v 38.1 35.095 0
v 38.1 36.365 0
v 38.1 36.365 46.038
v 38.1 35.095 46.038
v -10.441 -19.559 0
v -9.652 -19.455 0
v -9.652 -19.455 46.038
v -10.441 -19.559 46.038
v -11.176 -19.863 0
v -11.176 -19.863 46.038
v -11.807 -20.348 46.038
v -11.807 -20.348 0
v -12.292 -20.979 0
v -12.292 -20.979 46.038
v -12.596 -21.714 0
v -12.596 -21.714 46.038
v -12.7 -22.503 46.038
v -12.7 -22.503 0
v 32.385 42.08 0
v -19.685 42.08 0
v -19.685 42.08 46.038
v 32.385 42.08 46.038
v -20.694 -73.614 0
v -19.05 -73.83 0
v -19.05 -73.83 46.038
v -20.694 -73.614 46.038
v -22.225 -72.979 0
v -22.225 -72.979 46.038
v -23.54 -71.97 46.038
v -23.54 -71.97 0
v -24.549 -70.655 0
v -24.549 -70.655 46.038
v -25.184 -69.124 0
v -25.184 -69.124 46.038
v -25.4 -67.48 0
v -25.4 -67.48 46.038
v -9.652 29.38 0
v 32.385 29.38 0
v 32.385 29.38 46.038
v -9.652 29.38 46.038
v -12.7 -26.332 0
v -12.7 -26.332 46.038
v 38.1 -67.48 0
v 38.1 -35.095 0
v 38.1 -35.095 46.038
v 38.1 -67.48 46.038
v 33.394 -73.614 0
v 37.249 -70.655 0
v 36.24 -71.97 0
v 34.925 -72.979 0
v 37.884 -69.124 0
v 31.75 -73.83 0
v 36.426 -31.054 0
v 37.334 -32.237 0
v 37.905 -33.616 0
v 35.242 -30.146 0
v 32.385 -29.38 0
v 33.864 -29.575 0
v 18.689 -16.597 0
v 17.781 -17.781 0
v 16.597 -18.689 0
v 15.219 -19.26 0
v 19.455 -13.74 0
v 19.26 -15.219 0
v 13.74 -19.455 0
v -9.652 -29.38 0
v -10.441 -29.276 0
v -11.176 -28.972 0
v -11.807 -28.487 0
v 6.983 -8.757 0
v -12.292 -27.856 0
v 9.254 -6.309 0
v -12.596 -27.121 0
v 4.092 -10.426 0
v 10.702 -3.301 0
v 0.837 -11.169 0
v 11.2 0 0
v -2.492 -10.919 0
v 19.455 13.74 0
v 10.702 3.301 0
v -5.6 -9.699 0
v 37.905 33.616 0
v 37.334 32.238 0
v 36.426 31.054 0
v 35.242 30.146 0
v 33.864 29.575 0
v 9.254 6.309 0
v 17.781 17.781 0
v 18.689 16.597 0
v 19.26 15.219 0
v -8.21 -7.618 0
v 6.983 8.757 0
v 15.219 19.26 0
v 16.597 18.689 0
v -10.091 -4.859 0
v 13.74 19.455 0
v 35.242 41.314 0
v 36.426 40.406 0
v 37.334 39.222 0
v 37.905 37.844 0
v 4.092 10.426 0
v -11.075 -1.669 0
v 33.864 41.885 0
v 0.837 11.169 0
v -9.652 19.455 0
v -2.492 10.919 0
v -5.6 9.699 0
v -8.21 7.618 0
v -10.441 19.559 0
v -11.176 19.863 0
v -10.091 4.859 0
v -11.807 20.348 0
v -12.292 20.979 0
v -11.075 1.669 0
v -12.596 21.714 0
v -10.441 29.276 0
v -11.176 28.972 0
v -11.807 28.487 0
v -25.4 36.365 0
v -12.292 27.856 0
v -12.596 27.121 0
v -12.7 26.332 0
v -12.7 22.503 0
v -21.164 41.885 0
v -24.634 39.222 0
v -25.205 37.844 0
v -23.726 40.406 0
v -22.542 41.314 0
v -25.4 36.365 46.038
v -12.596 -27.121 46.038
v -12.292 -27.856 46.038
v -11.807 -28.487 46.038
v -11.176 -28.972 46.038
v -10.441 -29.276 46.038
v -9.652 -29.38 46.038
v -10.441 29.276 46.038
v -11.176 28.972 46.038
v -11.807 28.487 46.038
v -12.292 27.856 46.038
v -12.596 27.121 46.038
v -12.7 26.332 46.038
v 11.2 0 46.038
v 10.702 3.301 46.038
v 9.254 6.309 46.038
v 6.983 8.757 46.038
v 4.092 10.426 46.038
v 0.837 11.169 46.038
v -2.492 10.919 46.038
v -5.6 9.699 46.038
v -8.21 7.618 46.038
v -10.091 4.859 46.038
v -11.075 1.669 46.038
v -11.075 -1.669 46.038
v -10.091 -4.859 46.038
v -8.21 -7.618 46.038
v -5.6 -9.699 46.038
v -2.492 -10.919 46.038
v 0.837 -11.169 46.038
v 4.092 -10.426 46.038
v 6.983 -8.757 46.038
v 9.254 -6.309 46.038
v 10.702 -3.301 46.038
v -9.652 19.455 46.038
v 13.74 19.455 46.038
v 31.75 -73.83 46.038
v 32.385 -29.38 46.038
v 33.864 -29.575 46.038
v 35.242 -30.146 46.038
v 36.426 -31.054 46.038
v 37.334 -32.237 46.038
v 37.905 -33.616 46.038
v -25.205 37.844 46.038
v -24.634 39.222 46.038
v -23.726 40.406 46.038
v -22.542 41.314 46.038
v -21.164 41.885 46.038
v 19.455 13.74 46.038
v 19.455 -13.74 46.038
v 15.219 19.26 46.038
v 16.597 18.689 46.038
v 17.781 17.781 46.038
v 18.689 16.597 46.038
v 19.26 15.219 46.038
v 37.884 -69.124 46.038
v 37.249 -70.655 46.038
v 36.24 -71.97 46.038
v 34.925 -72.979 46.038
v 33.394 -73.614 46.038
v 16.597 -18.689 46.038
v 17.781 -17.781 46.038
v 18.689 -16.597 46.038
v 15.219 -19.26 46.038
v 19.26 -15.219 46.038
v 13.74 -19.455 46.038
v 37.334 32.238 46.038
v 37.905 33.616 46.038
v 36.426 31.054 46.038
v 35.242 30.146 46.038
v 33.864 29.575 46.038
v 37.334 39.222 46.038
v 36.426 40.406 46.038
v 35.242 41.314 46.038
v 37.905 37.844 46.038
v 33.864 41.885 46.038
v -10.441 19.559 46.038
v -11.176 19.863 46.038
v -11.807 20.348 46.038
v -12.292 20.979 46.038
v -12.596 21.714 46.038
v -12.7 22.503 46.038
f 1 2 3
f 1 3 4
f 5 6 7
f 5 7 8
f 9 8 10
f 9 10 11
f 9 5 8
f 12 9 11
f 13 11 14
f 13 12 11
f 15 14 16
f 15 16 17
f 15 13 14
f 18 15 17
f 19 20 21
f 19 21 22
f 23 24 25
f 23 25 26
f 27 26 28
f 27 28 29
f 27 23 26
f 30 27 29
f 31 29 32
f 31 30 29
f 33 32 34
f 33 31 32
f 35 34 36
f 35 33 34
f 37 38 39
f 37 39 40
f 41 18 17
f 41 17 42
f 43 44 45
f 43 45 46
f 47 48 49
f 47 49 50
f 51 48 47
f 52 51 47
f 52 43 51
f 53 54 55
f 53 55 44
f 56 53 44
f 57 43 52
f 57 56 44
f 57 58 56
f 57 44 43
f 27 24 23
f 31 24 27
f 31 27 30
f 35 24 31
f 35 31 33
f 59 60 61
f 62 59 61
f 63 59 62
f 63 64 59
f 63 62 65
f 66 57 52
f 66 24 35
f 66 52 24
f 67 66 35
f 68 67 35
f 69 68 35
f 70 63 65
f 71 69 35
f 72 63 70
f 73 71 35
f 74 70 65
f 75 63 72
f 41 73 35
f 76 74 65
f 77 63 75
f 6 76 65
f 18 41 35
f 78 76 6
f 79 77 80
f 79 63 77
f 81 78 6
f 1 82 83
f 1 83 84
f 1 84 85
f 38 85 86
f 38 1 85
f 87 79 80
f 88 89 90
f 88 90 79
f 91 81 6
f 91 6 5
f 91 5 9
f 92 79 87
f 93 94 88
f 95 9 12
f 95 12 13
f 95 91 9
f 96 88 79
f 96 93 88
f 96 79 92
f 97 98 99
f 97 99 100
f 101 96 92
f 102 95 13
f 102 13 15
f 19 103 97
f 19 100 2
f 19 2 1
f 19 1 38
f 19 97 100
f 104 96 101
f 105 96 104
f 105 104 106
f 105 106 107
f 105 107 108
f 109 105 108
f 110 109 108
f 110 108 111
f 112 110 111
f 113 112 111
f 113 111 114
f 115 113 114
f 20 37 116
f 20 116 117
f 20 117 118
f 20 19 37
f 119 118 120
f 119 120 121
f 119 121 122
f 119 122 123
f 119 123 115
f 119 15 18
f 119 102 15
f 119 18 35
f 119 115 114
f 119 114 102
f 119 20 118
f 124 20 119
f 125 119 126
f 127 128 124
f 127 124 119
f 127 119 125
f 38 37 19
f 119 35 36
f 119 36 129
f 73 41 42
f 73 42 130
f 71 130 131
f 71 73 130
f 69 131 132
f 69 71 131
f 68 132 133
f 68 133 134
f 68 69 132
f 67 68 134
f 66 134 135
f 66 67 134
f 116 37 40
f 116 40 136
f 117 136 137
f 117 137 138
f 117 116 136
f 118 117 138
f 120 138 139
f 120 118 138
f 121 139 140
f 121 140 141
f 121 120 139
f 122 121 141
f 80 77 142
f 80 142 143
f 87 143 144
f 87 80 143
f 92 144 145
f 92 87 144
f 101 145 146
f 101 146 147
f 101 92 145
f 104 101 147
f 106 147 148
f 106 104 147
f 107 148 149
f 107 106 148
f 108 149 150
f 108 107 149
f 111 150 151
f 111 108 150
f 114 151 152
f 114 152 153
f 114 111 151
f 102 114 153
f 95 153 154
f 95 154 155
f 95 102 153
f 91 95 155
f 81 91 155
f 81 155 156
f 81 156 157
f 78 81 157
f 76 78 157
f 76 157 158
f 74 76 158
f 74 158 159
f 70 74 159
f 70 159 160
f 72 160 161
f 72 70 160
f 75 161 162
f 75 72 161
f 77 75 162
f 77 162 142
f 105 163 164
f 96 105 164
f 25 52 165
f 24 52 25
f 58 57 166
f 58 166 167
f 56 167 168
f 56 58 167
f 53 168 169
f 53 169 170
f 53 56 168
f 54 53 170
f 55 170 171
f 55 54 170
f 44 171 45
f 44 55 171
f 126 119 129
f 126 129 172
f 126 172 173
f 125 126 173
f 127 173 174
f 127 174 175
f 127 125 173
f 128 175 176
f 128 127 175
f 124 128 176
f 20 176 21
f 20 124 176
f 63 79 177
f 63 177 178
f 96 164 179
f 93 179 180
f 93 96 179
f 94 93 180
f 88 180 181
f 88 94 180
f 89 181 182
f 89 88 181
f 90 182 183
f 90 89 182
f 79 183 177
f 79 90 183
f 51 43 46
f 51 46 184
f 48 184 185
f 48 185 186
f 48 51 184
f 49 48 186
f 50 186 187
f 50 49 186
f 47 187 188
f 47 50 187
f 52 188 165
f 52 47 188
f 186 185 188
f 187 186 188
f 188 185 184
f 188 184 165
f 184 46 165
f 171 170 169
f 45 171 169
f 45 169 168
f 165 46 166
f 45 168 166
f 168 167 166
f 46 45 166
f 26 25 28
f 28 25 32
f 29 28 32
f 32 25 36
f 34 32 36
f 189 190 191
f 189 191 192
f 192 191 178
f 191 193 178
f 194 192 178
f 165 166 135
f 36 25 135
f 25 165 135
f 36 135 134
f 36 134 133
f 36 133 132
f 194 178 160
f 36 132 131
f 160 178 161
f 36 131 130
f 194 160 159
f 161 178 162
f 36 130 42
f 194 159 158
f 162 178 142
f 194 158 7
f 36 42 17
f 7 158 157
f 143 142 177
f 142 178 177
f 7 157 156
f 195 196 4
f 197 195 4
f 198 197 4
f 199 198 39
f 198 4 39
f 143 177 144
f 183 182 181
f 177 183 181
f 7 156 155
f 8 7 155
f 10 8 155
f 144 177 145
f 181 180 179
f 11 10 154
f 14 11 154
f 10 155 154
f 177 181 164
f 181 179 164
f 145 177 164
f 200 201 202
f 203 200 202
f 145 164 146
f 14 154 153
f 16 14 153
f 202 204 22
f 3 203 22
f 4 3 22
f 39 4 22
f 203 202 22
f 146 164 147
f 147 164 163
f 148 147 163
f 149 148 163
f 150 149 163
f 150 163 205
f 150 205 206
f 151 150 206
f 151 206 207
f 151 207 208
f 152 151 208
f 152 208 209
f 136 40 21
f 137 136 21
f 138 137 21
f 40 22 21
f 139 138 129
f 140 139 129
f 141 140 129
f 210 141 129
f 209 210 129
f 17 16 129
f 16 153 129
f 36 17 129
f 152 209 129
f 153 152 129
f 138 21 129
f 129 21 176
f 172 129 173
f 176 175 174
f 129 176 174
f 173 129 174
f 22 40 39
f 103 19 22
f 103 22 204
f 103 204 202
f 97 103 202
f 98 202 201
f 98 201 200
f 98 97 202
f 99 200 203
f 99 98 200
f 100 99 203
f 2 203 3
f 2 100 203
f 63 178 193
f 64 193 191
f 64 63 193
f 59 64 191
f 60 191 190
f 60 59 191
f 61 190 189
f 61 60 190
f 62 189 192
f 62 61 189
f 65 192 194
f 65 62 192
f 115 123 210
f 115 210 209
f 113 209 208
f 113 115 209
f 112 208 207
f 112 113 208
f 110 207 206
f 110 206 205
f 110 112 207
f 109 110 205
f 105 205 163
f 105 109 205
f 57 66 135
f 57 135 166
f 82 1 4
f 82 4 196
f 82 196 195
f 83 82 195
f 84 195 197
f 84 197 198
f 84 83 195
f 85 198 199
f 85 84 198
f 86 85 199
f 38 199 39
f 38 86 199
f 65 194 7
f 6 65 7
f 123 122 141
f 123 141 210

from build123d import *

# Parameters (mm, degrees)
SKETCH1_R           = 11.2
BOSS_EXTRUDE1_DEPTH = 46.0375


with BuildPart() as part:
    # Sketch1 → Boss-Extrude1 (new body)
    with BuildSketch(Plane.XY):
        with BuildLine():
            Line((-25.4, -67.479999962), (-25.4, 36.365))
            ThreePointArc((-25.4, 36.365), (-23.726115254, 40.406115254), (-19.685, 42.08))
            Line((-19.685, 42.08), (32.385, 42.08))
            ThreePointArc((32.385, 42.08), (36.426115254, 40.406115254), (38.1, 36.365))
            Line((38.1, 36.365), (38.1, 35.095))
            ThreePointArc((38.1, 35.095), (36.426115254, 31.053884746), (32.385, 29.38))
            Line((32.385, 29.38), (-9.652, 29.38))
            ThreePointArc((-9.652, 29.38), (-11.807261469, 28.487261469), (-12.7, 26.332))
            Line((-12.7, 26.332), (-12.7, 22.503))
            ThreePointArc((-12.7, 22.503), (-11.807261469, 20.347738531), (-9.652, 19.455))
            Line((-9.652, 19.455), (0, 19.455))
            Line((0, 19.455), (13.74, 19.455))
            ThreePointArc((13.74, 19.455), (17.781115254, 17.781115254), (19.455, 13.74))
            Line((19.455, 13.74), (19.455, 0))
            Line((19.455, 0), (19.455, -13.74))
            ThreePointArc((19.455, -13.74), (17.781115254, -17.781115254), (13.74, -19.455))
            Line((13.74, -19.455), (0, -19.455))
            Line((0, -19.455), (-9.652, -19.455))
            ThreePointArc((-9.652, -19.455), (-11.807261469, -20.347738531), (-12.7, -22.503))
            Line((-12.7, -22.503), (-12.7, -26.331999962))
            ThreePointArc((-12.7, -26.331999962), (-11.807261469, -28.487261431), (-9.652, -29.379999962))
            Line((-9.652, -29.379999962), (32.385, -29.379999962))
            ThreePointArc((32.385, -29.379999962), (36.426115254, -31.053884708), (38.1, -35.094999962))
            Line((38.1, -35.094999962), (38.1, -67.479999962))
            ThreePointArc((38.1, -67.479999962), (36.240128061, -71.970128023), (31.75, -73.829999962))
            Line((31.75, -73.829999962), (-19.05, -73.829999962))
            ThreePointArc((-19.05, -73.829999962), (-23.540128061, -71.970128023), (-25.4, -67.479999962))
        make_face()
        Circle(SKETCH1_R, mode=Mode.SUBTRACT)
    extrude(amount=BOSS_EXTRUDE1_DEPTH)


solid = part.part
